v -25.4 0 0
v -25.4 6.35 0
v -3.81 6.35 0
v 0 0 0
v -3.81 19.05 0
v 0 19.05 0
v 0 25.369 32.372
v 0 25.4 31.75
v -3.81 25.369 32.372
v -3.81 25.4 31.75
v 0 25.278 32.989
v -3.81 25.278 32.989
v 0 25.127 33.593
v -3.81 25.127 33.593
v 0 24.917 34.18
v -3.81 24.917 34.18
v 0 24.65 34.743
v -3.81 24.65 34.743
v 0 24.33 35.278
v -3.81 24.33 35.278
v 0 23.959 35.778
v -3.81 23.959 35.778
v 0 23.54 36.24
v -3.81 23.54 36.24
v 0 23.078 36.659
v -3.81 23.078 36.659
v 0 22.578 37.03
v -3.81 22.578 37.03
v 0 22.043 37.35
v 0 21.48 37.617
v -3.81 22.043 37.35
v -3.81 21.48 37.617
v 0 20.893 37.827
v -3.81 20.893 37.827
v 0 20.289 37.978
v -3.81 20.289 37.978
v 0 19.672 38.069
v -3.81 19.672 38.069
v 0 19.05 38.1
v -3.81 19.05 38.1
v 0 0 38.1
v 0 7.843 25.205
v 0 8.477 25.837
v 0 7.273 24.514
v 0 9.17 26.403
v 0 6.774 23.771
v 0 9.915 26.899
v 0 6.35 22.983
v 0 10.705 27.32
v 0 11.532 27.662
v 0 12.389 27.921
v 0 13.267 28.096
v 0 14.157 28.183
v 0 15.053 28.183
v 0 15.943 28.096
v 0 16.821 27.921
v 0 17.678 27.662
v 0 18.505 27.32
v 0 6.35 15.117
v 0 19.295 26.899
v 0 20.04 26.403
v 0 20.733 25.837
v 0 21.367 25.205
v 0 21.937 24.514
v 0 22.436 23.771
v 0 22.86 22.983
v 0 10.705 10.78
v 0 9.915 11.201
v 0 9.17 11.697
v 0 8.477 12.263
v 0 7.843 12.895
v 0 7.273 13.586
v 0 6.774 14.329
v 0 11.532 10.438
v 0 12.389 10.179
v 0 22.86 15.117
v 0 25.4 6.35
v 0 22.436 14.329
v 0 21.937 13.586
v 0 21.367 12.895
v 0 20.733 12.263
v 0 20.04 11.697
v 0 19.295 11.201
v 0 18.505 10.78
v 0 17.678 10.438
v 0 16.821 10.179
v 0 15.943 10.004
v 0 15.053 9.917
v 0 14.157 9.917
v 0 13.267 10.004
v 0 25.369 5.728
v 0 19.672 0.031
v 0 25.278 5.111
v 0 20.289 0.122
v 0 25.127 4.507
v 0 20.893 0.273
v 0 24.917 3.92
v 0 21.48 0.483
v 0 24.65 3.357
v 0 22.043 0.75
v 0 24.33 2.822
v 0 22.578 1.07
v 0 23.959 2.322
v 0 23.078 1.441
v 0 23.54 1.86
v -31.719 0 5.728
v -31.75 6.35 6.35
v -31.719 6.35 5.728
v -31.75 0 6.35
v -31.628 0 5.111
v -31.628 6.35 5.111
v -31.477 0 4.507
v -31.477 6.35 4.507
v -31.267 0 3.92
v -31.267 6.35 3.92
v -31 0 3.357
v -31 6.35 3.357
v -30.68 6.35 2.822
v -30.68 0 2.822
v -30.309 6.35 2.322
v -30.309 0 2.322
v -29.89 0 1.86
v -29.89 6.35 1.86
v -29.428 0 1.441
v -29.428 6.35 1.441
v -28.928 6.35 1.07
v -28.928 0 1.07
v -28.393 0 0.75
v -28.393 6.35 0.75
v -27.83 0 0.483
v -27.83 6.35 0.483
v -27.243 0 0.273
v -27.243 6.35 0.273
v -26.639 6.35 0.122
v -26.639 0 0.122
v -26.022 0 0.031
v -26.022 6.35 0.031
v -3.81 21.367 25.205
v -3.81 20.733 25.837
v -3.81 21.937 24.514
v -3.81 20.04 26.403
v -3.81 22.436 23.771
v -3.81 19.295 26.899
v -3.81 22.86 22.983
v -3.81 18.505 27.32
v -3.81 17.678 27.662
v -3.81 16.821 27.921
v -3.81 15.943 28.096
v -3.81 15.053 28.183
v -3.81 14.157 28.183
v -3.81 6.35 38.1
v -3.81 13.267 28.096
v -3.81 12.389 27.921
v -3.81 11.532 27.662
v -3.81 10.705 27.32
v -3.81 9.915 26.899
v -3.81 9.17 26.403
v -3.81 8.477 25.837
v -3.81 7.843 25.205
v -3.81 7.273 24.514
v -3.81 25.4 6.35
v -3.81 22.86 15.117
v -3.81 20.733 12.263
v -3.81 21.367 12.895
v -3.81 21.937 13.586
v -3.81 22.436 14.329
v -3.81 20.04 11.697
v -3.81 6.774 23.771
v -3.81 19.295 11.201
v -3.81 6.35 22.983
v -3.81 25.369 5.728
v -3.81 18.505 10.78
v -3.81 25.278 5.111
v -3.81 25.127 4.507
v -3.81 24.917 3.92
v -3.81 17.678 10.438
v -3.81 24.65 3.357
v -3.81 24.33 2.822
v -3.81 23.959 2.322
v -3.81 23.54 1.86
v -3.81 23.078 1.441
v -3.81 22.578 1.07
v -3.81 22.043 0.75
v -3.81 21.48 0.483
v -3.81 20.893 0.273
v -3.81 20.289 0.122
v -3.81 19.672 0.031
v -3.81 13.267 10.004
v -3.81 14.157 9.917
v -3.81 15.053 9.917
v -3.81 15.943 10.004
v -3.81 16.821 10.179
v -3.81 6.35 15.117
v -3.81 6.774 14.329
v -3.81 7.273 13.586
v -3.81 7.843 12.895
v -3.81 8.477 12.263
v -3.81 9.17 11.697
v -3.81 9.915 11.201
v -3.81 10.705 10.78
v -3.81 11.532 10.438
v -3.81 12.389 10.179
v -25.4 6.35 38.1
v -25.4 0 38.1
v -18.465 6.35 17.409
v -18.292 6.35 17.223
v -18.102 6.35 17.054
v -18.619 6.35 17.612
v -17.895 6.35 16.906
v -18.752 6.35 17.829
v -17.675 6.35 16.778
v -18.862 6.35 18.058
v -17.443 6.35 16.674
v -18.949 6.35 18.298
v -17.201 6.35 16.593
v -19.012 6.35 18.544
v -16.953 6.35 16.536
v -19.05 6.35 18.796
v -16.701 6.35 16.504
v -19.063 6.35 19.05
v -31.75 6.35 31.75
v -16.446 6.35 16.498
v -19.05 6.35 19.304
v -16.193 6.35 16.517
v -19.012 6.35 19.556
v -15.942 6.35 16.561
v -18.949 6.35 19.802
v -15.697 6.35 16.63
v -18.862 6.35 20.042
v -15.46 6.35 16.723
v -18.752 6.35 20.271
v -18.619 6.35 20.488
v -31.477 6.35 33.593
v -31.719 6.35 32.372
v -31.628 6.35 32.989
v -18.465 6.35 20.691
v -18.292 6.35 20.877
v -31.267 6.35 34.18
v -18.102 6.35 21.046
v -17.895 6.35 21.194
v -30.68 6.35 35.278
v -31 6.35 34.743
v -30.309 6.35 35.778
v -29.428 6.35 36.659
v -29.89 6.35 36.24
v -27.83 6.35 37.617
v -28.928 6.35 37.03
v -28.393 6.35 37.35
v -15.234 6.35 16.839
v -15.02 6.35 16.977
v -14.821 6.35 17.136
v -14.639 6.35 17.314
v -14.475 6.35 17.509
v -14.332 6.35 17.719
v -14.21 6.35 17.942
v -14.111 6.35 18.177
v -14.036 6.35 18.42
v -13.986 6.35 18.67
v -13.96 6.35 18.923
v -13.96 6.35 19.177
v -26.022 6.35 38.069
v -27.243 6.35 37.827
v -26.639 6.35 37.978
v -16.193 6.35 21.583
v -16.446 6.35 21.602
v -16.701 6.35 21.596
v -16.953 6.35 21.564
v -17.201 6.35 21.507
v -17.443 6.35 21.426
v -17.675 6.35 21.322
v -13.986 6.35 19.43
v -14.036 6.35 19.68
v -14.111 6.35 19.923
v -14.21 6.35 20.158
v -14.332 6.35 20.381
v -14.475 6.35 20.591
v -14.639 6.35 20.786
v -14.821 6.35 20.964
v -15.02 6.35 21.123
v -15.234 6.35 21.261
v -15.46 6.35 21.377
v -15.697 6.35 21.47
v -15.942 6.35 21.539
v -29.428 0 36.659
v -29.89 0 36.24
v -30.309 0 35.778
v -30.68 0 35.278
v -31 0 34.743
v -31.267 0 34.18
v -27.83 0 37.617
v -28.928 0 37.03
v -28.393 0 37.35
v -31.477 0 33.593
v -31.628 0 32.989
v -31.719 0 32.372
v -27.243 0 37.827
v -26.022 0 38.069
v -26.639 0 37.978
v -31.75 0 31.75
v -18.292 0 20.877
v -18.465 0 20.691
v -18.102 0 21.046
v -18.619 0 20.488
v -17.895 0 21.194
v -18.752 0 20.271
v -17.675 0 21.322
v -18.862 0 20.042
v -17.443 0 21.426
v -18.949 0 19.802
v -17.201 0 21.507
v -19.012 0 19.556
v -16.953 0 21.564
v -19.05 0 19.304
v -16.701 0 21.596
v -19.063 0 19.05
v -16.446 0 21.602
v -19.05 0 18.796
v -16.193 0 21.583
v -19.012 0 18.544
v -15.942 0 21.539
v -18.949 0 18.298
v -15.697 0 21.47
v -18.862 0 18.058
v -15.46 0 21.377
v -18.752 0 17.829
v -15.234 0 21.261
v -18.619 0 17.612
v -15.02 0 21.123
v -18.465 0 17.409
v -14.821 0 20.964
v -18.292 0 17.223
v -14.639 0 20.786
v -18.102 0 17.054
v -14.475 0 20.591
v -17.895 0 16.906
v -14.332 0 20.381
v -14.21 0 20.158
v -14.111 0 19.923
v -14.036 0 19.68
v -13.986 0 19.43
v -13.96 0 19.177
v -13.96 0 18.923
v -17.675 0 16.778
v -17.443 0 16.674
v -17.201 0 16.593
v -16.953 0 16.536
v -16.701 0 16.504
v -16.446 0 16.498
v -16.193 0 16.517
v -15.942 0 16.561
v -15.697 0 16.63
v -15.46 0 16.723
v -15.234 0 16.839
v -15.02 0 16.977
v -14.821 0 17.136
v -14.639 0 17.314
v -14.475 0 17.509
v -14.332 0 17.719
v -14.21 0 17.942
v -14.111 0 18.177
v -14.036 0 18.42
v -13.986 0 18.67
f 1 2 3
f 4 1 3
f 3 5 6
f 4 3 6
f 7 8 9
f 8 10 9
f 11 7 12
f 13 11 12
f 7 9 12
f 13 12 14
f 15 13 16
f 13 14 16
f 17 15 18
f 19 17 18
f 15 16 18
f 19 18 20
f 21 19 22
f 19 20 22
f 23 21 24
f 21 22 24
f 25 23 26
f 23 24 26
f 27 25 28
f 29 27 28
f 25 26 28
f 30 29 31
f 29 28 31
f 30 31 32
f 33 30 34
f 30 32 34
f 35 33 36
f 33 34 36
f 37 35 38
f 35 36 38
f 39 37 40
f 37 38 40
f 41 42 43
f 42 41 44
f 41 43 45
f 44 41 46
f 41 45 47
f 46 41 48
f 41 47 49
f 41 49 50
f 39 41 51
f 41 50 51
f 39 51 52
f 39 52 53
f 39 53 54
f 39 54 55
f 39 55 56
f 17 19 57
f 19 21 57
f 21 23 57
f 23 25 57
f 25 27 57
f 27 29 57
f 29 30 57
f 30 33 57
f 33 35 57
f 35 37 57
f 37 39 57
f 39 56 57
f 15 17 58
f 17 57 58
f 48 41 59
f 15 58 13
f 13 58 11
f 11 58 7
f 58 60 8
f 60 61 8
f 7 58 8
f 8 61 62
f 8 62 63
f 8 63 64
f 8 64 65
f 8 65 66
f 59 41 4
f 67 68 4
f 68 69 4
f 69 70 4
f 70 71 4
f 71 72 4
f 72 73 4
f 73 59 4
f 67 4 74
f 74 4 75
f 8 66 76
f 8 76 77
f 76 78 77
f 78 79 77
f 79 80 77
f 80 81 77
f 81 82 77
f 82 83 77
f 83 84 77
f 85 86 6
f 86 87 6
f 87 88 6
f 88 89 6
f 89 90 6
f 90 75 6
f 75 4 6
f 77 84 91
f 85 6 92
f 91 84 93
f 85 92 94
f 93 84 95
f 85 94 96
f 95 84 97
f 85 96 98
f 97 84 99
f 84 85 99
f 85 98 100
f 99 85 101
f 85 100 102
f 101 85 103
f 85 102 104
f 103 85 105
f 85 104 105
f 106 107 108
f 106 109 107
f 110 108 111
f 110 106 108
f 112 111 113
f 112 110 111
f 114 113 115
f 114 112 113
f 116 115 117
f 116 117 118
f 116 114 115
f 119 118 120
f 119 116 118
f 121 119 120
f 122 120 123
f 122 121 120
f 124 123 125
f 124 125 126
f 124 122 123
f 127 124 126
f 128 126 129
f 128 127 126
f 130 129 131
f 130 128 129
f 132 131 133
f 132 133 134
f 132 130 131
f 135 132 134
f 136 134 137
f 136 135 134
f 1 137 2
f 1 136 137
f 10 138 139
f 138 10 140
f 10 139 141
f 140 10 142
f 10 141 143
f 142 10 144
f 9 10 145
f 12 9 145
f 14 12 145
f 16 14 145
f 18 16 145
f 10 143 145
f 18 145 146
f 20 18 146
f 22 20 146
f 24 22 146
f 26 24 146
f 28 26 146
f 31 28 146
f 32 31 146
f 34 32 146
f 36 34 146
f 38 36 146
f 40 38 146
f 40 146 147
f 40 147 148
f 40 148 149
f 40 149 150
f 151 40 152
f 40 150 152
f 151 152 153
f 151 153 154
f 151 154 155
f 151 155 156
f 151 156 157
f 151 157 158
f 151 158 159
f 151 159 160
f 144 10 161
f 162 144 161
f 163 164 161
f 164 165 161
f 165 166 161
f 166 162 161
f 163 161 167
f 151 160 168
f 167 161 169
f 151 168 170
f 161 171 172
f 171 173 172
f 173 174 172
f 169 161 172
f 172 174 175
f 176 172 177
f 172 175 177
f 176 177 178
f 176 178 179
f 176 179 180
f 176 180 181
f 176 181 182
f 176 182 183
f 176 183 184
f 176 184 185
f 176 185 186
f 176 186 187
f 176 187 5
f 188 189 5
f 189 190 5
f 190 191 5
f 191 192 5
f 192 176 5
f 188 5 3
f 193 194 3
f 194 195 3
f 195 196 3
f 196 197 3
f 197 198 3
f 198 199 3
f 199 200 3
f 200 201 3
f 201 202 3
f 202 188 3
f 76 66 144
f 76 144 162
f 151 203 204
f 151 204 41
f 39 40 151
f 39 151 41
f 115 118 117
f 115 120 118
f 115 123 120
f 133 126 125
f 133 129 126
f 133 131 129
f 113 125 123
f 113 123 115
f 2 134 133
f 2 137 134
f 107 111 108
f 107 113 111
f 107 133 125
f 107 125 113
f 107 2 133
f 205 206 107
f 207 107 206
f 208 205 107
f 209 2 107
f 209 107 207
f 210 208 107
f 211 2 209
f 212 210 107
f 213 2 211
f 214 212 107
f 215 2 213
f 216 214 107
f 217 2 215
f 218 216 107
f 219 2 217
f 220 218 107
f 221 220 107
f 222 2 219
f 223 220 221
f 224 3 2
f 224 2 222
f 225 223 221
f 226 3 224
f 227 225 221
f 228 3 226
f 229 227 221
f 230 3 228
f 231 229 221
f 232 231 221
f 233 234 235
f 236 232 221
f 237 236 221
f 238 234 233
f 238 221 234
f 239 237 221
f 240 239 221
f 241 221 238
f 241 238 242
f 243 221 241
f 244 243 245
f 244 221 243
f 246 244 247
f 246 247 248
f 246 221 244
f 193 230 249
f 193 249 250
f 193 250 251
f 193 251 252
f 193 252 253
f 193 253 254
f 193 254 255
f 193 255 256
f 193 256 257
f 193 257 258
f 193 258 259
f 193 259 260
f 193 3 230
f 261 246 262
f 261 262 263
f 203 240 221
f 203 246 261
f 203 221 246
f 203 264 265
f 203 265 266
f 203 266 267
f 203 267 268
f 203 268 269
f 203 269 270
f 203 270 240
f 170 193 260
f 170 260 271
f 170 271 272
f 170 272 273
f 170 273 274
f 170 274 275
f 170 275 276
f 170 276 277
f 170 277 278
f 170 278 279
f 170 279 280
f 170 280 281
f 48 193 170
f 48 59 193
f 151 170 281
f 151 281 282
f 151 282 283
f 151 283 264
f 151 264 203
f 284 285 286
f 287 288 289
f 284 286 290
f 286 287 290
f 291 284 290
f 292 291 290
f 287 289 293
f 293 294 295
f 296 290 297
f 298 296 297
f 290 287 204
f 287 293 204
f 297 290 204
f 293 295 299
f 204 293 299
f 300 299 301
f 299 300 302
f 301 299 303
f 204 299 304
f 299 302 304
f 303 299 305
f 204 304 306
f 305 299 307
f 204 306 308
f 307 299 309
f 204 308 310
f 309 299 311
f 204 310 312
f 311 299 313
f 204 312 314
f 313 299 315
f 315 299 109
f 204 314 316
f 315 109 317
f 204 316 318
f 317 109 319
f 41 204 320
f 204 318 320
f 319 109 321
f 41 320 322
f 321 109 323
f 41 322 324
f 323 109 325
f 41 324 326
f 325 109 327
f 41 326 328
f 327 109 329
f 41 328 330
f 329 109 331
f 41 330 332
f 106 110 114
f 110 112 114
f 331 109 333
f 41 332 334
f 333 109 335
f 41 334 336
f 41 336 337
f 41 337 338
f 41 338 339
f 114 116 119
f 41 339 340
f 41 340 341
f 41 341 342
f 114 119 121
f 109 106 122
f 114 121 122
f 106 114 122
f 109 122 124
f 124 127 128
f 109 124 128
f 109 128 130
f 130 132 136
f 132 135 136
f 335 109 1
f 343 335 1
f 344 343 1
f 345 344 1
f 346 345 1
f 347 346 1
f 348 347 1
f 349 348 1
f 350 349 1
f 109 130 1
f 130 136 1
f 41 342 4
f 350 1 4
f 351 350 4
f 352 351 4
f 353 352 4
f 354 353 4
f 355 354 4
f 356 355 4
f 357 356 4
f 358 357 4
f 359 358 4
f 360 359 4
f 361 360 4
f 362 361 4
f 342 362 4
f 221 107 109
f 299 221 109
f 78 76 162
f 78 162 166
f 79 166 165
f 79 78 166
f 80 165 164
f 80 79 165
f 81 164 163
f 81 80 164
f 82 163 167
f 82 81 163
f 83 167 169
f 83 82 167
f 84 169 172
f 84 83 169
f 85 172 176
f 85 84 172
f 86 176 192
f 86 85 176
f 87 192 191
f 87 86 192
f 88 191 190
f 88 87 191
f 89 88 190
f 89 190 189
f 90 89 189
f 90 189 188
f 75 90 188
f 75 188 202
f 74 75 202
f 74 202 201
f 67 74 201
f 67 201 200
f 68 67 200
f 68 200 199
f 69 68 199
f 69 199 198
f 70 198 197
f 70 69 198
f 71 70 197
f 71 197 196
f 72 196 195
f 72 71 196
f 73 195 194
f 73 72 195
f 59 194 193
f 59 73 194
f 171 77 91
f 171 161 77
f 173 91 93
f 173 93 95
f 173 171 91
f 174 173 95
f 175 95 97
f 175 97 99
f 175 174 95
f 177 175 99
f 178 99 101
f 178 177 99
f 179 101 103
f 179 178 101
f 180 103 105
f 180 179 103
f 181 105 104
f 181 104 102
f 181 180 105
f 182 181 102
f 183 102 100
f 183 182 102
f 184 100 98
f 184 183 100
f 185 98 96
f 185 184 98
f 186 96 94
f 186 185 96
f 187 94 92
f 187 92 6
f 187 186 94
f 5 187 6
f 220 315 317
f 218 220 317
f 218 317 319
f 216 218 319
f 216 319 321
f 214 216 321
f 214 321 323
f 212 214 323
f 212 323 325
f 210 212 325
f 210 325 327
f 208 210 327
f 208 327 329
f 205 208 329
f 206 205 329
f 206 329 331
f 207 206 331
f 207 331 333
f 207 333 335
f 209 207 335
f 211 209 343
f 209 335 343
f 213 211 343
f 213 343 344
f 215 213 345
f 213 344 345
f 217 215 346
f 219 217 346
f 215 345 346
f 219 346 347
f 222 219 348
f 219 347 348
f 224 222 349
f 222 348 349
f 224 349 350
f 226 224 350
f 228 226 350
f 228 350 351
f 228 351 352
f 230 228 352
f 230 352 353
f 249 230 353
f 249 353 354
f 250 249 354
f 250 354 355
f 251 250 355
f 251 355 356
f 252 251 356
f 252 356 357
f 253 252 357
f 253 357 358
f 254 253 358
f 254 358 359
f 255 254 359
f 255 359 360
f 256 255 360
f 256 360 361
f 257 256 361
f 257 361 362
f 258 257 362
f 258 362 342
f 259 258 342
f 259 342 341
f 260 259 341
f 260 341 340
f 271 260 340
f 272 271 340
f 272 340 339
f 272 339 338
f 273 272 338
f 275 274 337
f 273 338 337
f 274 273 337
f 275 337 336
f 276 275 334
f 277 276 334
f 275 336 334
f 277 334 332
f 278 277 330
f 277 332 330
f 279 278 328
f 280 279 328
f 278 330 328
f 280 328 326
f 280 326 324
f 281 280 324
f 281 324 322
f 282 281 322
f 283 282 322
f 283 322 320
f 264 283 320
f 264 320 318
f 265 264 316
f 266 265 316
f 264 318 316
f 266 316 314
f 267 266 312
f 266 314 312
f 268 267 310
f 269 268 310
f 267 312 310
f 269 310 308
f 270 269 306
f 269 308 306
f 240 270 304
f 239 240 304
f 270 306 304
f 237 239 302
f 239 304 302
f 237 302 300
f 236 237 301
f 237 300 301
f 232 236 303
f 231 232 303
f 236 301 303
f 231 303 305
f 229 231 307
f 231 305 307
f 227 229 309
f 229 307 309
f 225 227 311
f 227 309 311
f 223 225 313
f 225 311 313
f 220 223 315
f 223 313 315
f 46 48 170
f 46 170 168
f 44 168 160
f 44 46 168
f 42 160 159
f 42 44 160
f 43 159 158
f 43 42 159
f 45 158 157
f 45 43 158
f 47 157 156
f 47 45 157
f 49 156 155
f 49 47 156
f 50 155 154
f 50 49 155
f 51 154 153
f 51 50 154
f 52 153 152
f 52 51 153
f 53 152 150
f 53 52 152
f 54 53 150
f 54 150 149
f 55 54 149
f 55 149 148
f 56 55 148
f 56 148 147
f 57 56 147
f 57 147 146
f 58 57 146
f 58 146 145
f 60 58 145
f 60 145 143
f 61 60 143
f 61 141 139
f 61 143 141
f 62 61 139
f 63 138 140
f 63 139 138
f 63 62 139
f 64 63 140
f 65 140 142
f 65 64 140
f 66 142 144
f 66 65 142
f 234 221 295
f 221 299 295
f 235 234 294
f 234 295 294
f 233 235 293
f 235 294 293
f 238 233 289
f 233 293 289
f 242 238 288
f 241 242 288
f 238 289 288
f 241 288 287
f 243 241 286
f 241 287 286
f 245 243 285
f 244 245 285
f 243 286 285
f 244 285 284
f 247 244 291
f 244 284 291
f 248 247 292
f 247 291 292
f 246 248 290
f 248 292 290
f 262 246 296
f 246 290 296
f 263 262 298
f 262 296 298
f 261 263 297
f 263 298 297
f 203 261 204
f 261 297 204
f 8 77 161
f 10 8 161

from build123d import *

# Parameters (mm, degrees)
BOSS_EXTRUDE1_DEPTH     = 38.1
F_1_4_20_TAPPED_HOLE1_D = 5.1054
CUT_EXTRUDE1_DEPTH      = 32.75
FILLET1_R               = 6.35


with BuildPart() as part:
    # Sketch1 → Boss-Extrude1 (new body)
    with BuildSketch(Plane.XY):
        Polygon((0, 0), (0, 25.4), (-3.81, 25.4), (-3.81, 6.35), (-31.75, 6.35), (-31.75, 0), align=None)
    extrude(amount=BOSS_EXTRUDE1_DEPTH)

    # 1/4-20 Tapped Hole1 (through all)
    with Locations(Plane(origin=(0, 6.35, 0), x_dir=(1, 0, 0), z_dir=(0, 1, 0))):
        with Locations((-16.51, -19.05)):
            Hole(F_1_4_20_TAPPED_HOLE1_D / 2)

    # Sketch4 → Cut-Extrude1 (cut, through all)
    with BuildSketch(Plane(origin=(0, 0, 0), x_dir=(0, 0, -1), z_dir=(1, 0, 0))):
        with BuildLine():
            Line((-22.982901092, 22.86), (-15.117098908, 22.86))
            ThreePointArc((-15.117098908, 22.86), (-9.906, 14.605), (-15.117098908, 6.35))
            Line((-15.117098908, 6.35), (-22.982901092, 6.35))
            ThreePointArc((-22.982901092, 6.35), (-28.194, 14.605), (-22.982901092, 22.86))
        make_face()
    extrude(amount=-CUT_EXTRUDE1_DEPTH, mode=Mode.SUBTRACT)

    # Fillet1
    fillet1_edges = [part.edges().sort_by_distance(p)[0] for p in [
        (-1.905, 25.4, 38.1),
        (-31.75, 3.175, 38.1),
        (-31.75, 3.175, 0),
        (-1.905, 25.4, 0),
    ]]
    fillet(fillet1_edges, radius=FILLET1_R)


solid = part.part
